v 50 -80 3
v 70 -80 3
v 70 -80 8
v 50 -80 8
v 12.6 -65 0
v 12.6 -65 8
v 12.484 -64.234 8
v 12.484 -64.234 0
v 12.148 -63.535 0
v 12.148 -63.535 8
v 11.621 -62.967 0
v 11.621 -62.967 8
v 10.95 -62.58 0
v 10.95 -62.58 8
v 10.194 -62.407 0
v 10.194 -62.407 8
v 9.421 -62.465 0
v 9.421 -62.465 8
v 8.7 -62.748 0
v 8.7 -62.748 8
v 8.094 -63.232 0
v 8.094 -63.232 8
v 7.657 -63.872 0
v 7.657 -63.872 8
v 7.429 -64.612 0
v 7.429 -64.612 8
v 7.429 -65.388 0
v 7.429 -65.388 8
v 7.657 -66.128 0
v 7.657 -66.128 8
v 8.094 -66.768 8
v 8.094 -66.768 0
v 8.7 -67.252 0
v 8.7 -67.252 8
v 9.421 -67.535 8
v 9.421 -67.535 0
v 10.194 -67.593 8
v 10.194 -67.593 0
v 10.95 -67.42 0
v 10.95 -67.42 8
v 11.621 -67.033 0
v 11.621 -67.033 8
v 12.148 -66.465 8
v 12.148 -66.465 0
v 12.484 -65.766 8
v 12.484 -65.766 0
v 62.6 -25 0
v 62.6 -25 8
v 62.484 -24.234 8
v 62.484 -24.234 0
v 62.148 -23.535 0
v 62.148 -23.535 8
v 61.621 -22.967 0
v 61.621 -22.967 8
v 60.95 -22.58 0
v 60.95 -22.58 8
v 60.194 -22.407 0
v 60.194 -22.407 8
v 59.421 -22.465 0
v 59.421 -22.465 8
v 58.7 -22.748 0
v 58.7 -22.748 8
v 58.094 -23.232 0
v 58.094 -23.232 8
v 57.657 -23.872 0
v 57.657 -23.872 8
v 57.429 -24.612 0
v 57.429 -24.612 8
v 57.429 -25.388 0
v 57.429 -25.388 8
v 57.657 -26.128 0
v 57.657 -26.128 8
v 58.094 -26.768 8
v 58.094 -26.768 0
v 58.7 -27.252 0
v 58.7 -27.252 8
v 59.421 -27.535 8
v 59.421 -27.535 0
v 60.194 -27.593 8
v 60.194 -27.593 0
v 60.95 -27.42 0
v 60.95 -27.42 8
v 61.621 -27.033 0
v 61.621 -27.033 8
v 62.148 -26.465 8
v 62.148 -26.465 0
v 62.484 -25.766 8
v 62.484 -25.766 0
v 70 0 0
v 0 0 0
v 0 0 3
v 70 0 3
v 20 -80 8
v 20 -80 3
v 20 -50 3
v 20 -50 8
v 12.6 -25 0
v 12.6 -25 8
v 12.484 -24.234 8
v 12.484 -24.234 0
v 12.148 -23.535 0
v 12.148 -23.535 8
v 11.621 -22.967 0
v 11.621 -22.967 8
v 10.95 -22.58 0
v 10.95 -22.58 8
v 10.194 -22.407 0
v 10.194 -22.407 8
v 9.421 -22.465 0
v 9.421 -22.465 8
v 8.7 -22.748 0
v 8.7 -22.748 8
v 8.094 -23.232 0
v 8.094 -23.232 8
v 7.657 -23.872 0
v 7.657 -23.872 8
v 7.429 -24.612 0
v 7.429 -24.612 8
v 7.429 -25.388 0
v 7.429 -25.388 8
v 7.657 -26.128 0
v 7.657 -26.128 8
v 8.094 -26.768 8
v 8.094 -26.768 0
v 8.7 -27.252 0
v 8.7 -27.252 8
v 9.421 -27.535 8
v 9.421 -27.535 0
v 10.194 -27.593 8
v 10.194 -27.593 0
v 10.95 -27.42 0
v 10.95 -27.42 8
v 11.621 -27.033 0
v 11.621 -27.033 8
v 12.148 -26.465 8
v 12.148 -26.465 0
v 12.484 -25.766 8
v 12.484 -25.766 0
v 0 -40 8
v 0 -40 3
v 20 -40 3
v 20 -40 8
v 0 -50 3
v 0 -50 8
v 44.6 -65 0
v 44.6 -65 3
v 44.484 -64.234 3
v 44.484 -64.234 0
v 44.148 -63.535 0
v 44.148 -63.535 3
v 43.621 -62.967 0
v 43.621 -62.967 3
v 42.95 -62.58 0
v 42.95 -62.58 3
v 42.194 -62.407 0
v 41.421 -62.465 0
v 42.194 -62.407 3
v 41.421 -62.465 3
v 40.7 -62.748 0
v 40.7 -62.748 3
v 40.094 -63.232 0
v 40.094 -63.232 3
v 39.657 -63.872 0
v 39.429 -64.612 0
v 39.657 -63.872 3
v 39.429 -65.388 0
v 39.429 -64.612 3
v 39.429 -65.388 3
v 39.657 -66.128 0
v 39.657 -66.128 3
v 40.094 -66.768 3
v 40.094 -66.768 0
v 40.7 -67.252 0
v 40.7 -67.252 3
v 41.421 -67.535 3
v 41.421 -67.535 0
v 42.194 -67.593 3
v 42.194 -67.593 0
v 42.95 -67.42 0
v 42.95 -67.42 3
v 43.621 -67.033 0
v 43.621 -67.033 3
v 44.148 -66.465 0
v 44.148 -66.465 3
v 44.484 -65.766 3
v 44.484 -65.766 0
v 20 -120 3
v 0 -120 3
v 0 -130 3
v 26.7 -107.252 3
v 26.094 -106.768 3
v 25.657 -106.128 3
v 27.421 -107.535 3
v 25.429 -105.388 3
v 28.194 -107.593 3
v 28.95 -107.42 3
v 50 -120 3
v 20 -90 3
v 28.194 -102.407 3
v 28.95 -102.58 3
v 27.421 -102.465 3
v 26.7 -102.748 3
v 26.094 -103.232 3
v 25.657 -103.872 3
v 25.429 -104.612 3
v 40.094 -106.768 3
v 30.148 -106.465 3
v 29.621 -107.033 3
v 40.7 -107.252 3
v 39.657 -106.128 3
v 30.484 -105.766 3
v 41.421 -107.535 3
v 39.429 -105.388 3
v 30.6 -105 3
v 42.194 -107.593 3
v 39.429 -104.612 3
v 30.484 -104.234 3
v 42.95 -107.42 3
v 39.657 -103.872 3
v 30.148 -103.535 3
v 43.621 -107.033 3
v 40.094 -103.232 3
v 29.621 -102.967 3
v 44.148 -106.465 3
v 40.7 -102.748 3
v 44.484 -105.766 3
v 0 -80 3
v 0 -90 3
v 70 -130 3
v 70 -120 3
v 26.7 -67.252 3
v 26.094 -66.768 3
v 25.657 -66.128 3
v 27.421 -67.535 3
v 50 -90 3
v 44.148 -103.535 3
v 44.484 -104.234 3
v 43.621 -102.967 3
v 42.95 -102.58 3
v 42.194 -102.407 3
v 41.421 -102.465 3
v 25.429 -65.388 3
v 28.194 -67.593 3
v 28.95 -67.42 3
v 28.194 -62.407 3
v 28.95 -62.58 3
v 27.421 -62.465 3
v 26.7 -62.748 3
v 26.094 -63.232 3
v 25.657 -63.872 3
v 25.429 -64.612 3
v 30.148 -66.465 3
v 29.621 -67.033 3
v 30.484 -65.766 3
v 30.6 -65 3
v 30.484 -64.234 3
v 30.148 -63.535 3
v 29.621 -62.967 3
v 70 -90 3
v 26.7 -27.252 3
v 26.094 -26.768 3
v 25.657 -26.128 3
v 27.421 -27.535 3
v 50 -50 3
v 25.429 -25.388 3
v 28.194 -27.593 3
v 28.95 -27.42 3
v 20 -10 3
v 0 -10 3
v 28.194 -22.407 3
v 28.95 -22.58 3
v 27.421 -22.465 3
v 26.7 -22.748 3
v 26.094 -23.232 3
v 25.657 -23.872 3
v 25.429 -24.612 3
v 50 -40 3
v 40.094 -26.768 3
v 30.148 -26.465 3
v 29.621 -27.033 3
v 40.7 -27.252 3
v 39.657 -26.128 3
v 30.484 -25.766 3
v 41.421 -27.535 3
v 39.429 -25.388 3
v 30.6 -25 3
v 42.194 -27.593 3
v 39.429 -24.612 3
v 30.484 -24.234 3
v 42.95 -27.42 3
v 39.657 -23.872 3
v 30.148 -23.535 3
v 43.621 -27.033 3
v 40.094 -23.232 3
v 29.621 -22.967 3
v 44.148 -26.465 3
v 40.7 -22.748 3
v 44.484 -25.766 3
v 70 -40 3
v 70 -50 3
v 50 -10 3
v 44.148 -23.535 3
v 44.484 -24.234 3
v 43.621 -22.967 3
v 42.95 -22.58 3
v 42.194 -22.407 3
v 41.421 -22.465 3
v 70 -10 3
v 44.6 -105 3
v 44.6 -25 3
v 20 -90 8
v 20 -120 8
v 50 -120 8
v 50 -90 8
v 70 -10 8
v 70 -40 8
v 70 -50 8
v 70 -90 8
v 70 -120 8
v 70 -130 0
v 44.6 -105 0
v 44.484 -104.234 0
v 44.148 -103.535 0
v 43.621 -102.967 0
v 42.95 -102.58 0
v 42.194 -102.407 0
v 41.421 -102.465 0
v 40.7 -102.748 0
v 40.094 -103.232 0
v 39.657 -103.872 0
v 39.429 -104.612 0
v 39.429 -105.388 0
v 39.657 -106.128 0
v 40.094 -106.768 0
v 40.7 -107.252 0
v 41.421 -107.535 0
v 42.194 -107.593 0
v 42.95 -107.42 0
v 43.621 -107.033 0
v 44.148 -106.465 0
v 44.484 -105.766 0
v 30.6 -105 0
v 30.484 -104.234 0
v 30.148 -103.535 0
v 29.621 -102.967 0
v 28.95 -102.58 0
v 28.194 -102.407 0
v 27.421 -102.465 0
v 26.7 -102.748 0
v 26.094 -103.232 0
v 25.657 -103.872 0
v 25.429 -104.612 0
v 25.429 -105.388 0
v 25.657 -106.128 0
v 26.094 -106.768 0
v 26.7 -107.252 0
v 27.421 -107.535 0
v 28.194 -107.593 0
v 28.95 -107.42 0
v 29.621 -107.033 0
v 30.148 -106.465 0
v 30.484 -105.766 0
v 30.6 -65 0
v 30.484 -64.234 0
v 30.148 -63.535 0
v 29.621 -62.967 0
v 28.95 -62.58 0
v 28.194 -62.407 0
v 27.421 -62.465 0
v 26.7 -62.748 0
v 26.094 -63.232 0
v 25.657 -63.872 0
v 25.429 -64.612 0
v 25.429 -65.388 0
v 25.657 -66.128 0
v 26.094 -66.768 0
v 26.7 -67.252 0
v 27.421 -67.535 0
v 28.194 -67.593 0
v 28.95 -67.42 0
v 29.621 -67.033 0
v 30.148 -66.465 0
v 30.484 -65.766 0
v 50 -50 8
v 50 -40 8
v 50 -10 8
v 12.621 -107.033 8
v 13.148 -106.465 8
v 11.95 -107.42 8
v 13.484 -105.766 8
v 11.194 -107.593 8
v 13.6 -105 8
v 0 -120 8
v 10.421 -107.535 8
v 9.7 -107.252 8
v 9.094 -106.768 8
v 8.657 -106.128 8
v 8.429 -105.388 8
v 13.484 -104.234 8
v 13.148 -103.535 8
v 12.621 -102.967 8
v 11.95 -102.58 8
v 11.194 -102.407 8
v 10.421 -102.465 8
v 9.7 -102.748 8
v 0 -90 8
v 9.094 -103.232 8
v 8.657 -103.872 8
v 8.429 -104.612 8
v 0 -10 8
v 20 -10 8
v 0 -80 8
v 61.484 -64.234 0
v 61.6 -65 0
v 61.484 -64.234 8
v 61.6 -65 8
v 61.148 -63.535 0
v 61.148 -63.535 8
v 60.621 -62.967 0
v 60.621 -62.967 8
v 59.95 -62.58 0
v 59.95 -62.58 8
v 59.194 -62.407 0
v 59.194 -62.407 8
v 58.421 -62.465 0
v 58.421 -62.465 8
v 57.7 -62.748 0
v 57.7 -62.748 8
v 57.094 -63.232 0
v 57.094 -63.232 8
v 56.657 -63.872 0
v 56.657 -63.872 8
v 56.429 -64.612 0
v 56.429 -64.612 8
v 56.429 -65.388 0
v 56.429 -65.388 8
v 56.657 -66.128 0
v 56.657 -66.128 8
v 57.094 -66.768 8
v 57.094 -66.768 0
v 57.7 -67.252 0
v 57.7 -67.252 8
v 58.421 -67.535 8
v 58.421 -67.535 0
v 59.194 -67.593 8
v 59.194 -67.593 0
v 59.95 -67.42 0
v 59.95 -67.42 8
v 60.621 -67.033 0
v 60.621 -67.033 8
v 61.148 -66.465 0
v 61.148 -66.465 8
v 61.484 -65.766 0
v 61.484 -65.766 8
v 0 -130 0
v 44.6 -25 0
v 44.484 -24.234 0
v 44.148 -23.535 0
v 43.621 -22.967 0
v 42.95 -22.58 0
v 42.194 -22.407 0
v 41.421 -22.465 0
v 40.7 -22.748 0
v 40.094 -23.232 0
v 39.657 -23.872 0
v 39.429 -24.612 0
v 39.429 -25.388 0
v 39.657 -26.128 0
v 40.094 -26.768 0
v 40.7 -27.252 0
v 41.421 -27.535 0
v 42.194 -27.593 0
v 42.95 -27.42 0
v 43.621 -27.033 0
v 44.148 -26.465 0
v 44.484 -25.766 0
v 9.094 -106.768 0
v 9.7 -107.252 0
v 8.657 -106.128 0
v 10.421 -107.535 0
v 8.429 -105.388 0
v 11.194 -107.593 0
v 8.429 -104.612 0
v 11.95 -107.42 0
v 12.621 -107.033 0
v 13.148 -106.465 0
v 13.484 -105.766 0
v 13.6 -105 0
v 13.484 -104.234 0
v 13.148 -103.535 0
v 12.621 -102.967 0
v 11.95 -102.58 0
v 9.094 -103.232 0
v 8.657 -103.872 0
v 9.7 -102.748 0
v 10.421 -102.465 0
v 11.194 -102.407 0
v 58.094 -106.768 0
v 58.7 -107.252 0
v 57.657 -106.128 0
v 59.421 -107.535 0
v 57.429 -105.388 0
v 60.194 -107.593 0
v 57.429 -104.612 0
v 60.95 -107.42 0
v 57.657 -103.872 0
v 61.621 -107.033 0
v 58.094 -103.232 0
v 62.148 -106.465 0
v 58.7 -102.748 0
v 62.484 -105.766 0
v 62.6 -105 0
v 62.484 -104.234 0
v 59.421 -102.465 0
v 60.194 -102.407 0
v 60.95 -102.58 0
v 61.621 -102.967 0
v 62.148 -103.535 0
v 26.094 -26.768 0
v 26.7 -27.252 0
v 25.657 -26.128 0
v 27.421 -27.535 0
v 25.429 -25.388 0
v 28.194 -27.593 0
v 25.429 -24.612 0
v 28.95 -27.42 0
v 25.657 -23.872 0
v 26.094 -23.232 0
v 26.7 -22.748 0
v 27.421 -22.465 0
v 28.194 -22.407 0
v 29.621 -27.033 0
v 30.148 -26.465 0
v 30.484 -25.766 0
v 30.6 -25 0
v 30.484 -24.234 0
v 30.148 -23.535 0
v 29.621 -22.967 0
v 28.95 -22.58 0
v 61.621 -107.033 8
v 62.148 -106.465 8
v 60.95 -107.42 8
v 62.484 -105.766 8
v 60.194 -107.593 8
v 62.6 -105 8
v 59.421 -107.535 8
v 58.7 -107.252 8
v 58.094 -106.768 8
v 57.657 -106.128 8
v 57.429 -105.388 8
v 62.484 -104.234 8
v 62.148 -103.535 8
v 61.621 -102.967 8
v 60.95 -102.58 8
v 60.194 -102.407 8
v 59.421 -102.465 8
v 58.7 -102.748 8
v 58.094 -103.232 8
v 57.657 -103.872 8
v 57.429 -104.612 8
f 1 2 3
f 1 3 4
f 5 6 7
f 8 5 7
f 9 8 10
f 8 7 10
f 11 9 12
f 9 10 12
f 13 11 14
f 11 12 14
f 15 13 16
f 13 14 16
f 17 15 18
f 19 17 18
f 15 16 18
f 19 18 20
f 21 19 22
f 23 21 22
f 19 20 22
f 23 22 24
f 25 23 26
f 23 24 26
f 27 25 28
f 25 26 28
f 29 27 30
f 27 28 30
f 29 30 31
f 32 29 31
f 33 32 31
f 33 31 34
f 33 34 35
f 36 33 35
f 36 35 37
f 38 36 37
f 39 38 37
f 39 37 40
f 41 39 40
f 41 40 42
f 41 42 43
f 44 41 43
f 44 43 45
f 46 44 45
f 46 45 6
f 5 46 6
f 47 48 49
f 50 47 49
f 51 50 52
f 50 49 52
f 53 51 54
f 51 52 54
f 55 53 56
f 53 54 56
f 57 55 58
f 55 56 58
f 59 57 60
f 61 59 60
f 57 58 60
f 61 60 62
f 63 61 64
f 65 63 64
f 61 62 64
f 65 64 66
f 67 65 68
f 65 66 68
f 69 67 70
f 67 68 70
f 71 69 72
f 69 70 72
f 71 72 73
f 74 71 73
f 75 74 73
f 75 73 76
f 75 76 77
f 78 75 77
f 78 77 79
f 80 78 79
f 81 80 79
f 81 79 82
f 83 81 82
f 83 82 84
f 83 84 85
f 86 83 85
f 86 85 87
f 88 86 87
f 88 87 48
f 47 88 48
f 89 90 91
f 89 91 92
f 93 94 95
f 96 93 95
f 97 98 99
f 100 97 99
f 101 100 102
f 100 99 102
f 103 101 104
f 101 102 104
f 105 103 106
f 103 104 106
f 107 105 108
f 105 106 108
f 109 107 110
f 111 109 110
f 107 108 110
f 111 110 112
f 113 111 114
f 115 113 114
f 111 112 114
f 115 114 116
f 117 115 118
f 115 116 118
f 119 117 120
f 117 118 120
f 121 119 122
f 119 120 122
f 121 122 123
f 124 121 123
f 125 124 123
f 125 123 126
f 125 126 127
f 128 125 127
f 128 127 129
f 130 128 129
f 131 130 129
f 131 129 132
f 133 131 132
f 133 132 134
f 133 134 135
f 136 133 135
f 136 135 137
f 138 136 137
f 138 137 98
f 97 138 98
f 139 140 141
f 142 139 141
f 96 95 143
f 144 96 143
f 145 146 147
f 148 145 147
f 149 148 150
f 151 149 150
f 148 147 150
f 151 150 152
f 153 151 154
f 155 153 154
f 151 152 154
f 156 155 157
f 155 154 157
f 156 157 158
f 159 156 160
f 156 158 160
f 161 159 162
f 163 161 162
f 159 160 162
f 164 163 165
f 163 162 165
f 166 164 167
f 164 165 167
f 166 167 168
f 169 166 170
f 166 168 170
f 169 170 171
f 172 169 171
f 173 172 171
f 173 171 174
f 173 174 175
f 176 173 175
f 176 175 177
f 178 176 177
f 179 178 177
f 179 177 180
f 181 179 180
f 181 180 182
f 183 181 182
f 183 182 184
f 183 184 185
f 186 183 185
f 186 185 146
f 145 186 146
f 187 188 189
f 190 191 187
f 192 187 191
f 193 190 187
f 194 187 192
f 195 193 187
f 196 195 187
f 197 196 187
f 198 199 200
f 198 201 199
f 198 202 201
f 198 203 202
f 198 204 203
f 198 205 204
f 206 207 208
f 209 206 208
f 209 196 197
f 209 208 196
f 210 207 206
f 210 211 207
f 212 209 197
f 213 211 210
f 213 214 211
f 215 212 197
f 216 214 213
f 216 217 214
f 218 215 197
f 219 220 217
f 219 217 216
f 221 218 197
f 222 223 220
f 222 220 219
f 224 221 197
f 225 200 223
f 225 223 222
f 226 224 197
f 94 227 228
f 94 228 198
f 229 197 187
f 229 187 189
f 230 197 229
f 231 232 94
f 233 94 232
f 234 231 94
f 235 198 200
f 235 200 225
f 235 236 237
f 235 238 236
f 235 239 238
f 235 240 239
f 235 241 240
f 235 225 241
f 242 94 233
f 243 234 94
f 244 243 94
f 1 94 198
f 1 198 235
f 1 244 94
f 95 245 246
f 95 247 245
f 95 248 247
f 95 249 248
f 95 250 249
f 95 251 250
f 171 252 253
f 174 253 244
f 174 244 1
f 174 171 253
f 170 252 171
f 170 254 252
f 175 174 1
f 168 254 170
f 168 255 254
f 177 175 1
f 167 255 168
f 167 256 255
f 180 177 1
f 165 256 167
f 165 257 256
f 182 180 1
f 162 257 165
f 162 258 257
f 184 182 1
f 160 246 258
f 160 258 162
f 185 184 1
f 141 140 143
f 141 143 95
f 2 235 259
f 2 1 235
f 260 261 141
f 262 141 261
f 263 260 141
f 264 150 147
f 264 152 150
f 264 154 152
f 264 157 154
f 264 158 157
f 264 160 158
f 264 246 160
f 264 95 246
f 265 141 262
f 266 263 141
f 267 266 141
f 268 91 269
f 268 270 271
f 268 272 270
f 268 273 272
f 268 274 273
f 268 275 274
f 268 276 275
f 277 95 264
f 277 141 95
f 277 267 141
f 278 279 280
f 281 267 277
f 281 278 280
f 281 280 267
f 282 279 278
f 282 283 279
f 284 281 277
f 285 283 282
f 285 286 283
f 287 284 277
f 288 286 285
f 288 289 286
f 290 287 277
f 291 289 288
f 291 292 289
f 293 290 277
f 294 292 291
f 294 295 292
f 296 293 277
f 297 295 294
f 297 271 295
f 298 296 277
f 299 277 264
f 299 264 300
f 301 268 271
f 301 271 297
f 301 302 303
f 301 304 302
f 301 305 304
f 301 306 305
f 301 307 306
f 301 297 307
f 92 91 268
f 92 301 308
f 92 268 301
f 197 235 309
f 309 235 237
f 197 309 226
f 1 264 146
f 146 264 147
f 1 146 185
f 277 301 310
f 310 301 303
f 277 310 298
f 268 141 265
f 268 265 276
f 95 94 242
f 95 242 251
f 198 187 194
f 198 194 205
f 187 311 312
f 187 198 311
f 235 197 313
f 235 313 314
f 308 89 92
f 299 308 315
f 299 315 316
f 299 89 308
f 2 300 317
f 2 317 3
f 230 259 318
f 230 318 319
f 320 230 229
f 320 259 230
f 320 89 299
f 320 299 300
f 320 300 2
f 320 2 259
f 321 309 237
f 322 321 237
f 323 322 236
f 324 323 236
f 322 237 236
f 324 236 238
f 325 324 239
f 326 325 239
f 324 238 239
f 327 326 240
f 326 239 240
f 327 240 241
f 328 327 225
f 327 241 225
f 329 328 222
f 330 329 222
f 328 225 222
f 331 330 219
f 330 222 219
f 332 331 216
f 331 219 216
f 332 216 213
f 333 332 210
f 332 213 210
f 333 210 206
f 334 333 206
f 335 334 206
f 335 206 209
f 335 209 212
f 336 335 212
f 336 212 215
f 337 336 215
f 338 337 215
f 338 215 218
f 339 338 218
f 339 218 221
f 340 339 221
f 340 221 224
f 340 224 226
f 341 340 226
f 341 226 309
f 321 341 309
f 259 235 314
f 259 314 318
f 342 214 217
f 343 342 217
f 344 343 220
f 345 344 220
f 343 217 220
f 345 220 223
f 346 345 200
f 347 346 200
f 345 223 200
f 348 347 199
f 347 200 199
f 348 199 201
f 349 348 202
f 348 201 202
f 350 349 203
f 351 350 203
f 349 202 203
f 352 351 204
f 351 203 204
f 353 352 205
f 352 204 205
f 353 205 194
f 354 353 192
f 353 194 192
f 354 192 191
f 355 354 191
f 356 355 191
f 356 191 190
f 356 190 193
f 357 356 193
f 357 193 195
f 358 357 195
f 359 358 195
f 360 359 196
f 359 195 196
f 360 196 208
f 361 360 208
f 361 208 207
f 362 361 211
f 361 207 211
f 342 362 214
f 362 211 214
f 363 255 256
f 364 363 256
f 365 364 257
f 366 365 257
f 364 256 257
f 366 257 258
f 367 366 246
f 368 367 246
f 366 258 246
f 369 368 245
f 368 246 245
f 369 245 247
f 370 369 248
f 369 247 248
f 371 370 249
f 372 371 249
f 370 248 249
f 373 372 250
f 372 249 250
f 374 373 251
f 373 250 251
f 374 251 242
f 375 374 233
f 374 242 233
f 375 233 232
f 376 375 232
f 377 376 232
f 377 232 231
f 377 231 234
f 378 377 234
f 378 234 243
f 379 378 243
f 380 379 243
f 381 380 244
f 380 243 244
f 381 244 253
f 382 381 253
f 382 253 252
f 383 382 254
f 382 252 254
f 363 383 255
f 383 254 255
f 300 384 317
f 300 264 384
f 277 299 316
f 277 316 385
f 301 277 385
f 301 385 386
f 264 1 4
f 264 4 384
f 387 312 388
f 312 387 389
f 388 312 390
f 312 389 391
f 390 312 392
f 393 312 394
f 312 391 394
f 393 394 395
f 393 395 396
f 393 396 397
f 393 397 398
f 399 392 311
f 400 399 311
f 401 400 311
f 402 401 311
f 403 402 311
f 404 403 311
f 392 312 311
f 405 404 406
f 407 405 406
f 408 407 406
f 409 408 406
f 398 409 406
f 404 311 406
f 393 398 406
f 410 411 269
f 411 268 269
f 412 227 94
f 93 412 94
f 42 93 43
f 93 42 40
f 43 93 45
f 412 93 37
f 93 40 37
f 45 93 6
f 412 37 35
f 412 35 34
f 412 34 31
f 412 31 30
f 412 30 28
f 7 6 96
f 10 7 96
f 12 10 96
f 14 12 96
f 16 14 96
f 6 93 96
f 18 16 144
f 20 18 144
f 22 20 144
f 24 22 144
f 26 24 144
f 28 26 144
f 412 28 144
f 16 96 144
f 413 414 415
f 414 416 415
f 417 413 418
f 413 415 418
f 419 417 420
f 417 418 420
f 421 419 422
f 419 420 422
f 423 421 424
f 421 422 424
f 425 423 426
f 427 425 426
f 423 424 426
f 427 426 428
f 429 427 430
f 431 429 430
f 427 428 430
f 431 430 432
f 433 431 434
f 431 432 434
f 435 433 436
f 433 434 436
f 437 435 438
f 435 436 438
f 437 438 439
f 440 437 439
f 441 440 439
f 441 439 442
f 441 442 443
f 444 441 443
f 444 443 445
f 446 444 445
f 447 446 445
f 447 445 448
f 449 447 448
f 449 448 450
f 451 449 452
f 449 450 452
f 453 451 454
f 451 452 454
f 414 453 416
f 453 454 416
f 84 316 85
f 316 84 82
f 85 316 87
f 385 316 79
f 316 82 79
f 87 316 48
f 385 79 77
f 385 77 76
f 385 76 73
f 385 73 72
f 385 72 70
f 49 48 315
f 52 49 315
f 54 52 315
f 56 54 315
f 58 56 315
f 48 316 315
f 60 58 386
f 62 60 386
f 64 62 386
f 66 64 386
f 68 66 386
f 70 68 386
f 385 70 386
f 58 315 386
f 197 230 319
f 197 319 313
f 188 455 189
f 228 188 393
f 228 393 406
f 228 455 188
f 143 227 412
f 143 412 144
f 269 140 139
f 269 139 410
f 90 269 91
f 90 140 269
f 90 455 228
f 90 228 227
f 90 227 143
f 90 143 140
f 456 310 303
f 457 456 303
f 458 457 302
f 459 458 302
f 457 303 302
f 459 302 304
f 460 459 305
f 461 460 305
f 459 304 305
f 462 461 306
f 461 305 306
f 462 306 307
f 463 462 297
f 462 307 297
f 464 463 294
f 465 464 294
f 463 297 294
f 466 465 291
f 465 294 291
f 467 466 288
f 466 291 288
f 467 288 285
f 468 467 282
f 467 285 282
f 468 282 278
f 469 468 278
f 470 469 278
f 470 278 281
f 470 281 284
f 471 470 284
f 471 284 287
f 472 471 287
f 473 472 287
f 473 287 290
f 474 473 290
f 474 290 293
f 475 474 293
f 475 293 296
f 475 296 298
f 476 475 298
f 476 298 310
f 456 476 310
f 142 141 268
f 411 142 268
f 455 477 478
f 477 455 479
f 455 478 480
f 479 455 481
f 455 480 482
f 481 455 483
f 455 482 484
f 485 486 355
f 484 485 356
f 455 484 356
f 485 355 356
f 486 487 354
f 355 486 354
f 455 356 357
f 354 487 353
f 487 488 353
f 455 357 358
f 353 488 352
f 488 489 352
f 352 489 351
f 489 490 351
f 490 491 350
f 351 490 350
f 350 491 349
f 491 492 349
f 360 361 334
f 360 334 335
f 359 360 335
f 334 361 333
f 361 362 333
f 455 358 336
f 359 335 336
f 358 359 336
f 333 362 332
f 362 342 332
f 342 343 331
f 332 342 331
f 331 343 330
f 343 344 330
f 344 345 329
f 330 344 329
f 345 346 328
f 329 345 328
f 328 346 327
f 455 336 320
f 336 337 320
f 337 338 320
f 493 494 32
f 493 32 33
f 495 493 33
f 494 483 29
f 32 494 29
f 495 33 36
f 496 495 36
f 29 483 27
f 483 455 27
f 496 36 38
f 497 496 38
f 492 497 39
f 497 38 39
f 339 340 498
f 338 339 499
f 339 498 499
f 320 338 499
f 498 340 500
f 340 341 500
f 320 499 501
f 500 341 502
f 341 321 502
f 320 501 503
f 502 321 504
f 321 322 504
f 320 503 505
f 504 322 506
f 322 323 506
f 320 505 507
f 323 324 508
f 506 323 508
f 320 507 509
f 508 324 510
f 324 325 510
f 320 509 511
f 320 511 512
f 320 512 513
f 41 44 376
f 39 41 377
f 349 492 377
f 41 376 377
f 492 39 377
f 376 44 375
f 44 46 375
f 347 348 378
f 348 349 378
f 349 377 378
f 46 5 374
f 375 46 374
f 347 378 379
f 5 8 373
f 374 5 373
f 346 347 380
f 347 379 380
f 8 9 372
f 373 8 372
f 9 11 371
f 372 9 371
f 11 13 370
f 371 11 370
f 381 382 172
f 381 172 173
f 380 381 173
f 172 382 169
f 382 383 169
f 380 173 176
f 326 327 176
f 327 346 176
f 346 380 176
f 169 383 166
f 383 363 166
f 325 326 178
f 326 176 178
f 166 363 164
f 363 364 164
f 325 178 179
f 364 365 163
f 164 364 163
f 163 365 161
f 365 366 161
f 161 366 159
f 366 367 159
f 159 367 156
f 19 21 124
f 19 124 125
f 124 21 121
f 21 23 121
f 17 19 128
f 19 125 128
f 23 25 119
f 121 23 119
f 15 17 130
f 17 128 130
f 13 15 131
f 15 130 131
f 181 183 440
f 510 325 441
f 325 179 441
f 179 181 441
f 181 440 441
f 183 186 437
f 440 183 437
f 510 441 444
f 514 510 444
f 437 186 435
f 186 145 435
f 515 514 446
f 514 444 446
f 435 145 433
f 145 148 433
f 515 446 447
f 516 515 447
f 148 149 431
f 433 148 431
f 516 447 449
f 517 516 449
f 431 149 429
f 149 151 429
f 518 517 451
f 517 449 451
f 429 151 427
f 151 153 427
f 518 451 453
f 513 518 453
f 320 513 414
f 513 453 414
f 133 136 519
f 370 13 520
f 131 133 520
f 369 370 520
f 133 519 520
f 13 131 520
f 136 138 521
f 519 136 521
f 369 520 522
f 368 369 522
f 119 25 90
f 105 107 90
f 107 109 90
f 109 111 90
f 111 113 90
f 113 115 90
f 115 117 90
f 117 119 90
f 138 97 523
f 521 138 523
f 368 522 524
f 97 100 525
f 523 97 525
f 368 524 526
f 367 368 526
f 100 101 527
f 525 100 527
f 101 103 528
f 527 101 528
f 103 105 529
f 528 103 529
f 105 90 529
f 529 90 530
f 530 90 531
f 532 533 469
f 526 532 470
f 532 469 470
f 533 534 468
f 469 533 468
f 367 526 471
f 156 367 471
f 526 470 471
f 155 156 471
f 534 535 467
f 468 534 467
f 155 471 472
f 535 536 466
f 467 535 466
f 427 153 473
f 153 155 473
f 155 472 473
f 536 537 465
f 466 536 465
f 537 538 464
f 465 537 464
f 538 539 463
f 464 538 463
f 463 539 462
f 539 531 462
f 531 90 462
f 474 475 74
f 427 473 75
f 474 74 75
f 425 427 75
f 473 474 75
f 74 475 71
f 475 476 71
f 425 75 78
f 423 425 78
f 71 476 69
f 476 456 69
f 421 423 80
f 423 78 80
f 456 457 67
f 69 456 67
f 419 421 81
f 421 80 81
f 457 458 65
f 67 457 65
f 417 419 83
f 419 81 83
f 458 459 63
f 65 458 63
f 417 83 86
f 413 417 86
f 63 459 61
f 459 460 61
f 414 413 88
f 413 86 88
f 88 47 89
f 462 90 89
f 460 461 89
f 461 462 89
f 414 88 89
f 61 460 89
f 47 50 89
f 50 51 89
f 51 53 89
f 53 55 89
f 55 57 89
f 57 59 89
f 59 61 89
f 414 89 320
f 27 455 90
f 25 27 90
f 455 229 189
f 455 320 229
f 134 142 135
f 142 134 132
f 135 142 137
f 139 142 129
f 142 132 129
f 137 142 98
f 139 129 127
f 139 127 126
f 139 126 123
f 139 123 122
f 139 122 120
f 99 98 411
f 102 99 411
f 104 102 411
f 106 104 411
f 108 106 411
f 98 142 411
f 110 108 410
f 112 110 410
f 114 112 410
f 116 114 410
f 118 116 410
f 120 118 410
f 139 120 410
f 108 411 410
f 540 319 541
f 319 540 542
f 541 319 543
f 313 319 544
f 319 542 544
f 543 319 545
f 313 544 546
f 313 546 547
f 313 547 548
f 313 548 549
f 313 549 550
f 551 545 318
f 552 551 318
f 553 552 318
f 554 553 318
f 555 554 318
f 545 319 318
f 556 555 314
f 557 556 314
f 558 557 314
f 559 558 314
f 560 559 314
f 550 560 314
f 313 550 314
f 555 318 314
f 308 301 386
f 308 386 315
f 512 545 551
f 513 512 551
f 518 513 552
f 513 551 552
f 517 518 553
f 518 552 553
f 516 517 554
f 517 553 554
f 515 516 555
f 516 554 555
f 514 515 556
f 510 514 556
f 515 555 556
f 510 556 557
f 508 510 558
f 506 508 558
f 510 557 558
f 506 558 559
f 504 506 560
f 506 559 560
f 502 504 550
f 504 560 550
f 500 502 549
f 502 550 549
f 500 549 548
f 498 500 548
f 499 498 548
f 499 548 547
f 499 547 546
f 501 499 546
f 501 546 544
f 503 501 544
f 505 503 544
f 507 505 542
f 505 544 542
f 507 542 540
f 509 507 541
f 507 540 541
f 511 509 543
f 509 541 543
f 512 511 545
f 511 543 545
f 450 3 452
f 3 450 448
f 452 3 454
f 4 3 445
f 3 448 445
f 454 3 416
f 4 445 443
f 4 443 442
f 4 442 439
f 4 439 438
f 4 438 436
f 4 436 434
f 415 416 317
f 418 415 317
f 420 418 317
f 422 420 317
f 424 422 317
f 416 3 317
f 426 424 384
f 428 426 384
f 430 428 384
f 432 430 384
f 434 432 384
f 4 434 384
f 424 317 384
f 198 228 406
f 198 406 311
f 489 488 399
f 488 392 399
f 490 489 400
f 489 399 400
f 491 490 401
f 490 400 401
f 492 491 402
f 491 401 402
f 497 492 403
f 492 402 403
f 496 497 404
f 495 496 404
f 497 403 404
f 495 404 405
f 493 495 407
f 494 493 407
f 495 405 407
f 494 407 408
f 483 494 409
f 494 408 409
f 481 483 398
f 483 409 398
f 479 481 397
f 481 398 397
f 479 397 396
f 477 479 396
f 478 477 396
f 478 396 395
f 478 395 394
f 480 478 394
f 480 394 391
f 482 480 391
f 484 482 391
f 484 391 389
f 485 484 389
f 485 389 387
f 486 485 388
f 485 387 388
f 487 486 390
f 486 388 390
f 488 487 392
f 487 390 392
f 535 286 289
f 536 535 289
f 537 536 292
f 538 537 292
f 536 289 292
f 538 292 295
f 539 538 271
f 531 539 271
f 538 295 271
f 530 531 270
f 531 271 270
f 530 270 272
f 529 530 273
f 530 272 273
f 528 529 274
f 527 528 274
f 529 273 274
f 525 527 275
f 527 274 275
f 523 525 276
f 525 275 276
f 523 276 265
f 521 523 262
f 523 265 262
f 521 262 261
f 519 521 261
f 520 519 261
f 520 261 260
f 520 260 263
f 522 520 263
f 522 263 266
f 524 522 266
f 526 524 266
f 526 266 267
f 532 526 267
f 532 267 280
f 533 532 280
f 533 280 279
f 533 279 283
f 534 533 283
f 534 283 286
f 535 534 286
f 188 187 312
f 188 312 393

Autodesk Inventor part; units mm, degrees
ref_plane "YZ Plane" through (0, 0, 0) normal (1, 0, 0) x (0, 1, 0)
ref_plane "XZ Plane" through (0, 0, 0) normal (0, 1, 0) x (-1, 0, 0)
ref_plane "XY Plane" through (0, 0, 0) normal (0, 0, 1) x (1, 0, 0)
sketch "Sketch1" plane through (0, 0, 0) normal (0, 0, 1) x (1, 0, 0)
  line L0 (0, 0) -> (70, 0)
  line L1 (70, 0) -> (70, -130)
  line L2 (70, -130) -> (0, -130)
  line L3 (0, -130) -> (0, 0)
  line L4 (0, -10) -> (20, -10)
  line L5 (20, -10) -> (20, -40)
  line L6 (20, -40) -> (0, -40)
  line L7 (0, -40) -> (0, -10)
  line L8 (50, -10) -> (70, -10)
  line L9 (70, -10) -> (70, -40)
  line L10 (70, -40) -> (50, -40)
  line L11 (50, -40) -> (50, -10)
  line L12 (0, -50) -> (20, -50)
  line L13 (20, -50) -> (20, -80)
  line L14 (20, -80) -> (0, -80)
  line L15 (0, -80) -> (0, -50)
  line L16 (50, -50) -> (70, -50)
  line L17 (70, -50) -> (70, -80)
  line L18 (70, -80) -> (50, -80)
  line L19 (50, -80) -> (50, -50)
  line L20 (0, -90) -> (20, -90)
  line L21 (20, -90) -> (20, -120)
  line L22 (20, -120) -> (0, -120)
  line L23 (0, -120) -> (0, -90)
  line L24 (50, -90) -> (70, -90)
  line L25 (70, -90) -> (70, -120)
  line L26 (70, -120) -> (50, -120)
  line L27 (50, -120) -> (50, -90)
  dimension "d0" = 70
  dimension "d1" = 130
  dimension "d2" = 20
  dimension "d3" = 30
  dimension "d4" = 20
  dimension "d5" = 30
  dimension "d6" = 20
  dimension "d7" = 30
  dimension "d8" = 20
  dimension "d9" = 30
  dimension "d10" = 20
  dimension "d11" = 30
  dimension "d12" = 20
  dimension "d13" = 30
  dimension "d14" = 10
  dimension "d15" = 10
  dimension "d16" = 10
  dimension "d17" = 10
  dimension "d18" = 10
  dimension "d19" = 0
  dimension "d20" = 30
extrude "Extrusion1" add sketch "Sketch1" along normal blind 3 contours L0 L1 L8 L11 L10 L16 L19 L18 L24 L27 L26 L2 L3 L22 L21 L20 L14 L13 L12 L6 L5 L4
sketch "Sketch6" plane through (0, 0, 0) normal (0, 0, -1) x (-1, 0, 0)
  line L0 (-50, -10) -> (-70, -10)
  line L1 (-70, -10) -> (-70, -40)
  line L2 (-70, -40) -> (-50, -40)
  line L3 (-50, -40) -> (-50, -10)
  line L4 (-20, -10) -> (0, -10)
  line L5 (0, -10) -> (0, -40)
  line L6 (0, -40) -> (-20, -40)
  line L7 (-20, -40) -> (-20, -10)
  line L8 (-20, -50) -> (0, -50)
  line L9 (0, -50) -> (0, -80)
  line L10 (0, -80) -> (-20, -80)
  line L11 (-20, -80) -> (-20, -50)
  line L12 (0, -90) -> (-20, -90)
  line L13 (-20, -90) -> (-20, -120)
  line L14 (-20, -120) -> (0, -120)
  line L15 (0, -120) -> (0, -90)
  line L16 (-50, -90) -> (-70, -90)
  line L17 (-70, -90) -> (-70, -120)
  line L18 (-70, -120) -> (-50, -120)
  line L19 (-50, -120) -> (-50, -90)
  line L20 (-70, -80) -> (-50, -80)
  line L21 (-50, -80) -> (-50, -50)
  line L22 (-50, -50) -> (-70, -50)
  line L23 (-70, -50) -> (-70, -80)
  point P0 (0, 0)
extrude "Extrusion3" add sketch "Sketch6" against normal blind 8
sketch "Sketch7" plane through (0, 0, 8) normal (0, 0, 1) x (1, 0, 0)
  point P0 (0, 0)
sketch "Sketch8" plane through (0, 0, 8) normal (0, 0, 1) x (1, 0, 0)
  circle A0 centre (10, -25) radius 2.6
  circle A1 centre (28, -25) radius 2.6
  circle A2 centre (42, -25) radius 2.6
  circle A3 centre (60, -25) radius 2.6
  circle A4 centre (10, -65) radius 2.6
  circle A5 centre (28, -65) radius 2.6
  circle A6 centre (42, -65) radius 2.6
  circle A7 centre (59, -65) radius 2.6
  circle A8 centre (11, -105) radius 2.6
  circle A9 centre (28, -105) radius 2.6
  circle A10 centre (42, -105) radius 2.6
  circle A11 centre (60, -105) radius 2.6
  line L0 (20, -10) -> (0, -10) projected
  line L1 (20, -40) -> (20, -10) projected
  line L2 (50, -10) -> (50, -40) projected
  line L3 (70, -10) -> (50, -10) projected
  line L4 (70, -40) -> (70, -10) projected
  line L5 (20, -50) -> (0, -50) projected
  line L6 (20, -90) -> (0, -90) projected
  line L7 (50, -50) -> (50, -80) projected
  point P0 (0, 0)
  dimension "d29" = 5.2
  dimension "d30" = 5.2
  dimension "d31" = 5.2
  dimension "d32" = 5.2
  dimension "d33" = 5.2
  dimension "d34" = 5.2
  dimension "d35" = 5.2
  dimension "d36" = 5.2
  dimension "d37" = 5.2
  dimension "d38" = 5.2
  dimension "d39" = 5.2
  dimension "d40" = 5.2
  dimension "d41" = 15
  dimension "d42" = 10
  dimension "d43" = 8
  dimension "d44" = 8
  dimension "d45" = 15
  dimension "d46" = 10
  dimension "d47" = 15
  dimension "d48" = 15
  dimension "d49" = 8
extrude "Extrusion4" cut sketch "Sketch8" against normal through all
properties part number "parking lot frame"
